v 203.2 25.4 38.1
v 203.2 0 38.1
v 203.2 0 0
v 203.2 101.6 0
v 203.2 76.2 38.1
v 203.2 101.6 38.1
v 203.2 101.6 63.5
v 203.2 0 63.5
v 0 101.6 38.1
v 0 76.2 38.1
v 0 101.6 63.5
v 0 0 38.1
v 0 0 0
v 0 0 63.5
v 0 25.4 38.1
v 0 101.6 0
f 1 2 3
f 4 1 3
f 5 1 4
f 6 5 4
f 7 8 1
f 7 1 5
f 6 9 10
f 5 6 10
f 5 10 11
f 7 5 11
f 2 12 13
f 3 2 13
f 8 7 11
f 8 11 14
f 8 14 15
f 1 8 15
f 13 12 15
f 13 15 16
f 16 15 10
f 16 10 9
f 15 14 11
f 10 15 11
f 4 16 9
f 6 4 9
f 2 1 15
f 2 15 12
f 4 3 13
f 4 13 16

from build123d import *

# Parameters (mm, degrees)
F0_W     = 50.8
F0_H     = 25.4
F1_DEPTH = 203.2


with BuildPart() as f1:
    # F0 (on Right) → F1 (new body)
    with BuildSketch(Plane.YZ):
        Polygon((0, 63.5), (25.4, 38.1), (25.4, 63.5), align=None)
        with Locations((50.8, 50.8)):
            Rectangle(F0_W, F0_H)
        Polygon((76.2, 63.5), (76.2, 38.1), (101.6, 63.5), align=None)
        Polygon((0, 38.1), (0, 0), (101.6, 0), (101.6, 38.1), (76.2, 38.1), (25.4, 38.1), align=None)
    extrude(amount=F1_DEPTH)


solid = f1.part
